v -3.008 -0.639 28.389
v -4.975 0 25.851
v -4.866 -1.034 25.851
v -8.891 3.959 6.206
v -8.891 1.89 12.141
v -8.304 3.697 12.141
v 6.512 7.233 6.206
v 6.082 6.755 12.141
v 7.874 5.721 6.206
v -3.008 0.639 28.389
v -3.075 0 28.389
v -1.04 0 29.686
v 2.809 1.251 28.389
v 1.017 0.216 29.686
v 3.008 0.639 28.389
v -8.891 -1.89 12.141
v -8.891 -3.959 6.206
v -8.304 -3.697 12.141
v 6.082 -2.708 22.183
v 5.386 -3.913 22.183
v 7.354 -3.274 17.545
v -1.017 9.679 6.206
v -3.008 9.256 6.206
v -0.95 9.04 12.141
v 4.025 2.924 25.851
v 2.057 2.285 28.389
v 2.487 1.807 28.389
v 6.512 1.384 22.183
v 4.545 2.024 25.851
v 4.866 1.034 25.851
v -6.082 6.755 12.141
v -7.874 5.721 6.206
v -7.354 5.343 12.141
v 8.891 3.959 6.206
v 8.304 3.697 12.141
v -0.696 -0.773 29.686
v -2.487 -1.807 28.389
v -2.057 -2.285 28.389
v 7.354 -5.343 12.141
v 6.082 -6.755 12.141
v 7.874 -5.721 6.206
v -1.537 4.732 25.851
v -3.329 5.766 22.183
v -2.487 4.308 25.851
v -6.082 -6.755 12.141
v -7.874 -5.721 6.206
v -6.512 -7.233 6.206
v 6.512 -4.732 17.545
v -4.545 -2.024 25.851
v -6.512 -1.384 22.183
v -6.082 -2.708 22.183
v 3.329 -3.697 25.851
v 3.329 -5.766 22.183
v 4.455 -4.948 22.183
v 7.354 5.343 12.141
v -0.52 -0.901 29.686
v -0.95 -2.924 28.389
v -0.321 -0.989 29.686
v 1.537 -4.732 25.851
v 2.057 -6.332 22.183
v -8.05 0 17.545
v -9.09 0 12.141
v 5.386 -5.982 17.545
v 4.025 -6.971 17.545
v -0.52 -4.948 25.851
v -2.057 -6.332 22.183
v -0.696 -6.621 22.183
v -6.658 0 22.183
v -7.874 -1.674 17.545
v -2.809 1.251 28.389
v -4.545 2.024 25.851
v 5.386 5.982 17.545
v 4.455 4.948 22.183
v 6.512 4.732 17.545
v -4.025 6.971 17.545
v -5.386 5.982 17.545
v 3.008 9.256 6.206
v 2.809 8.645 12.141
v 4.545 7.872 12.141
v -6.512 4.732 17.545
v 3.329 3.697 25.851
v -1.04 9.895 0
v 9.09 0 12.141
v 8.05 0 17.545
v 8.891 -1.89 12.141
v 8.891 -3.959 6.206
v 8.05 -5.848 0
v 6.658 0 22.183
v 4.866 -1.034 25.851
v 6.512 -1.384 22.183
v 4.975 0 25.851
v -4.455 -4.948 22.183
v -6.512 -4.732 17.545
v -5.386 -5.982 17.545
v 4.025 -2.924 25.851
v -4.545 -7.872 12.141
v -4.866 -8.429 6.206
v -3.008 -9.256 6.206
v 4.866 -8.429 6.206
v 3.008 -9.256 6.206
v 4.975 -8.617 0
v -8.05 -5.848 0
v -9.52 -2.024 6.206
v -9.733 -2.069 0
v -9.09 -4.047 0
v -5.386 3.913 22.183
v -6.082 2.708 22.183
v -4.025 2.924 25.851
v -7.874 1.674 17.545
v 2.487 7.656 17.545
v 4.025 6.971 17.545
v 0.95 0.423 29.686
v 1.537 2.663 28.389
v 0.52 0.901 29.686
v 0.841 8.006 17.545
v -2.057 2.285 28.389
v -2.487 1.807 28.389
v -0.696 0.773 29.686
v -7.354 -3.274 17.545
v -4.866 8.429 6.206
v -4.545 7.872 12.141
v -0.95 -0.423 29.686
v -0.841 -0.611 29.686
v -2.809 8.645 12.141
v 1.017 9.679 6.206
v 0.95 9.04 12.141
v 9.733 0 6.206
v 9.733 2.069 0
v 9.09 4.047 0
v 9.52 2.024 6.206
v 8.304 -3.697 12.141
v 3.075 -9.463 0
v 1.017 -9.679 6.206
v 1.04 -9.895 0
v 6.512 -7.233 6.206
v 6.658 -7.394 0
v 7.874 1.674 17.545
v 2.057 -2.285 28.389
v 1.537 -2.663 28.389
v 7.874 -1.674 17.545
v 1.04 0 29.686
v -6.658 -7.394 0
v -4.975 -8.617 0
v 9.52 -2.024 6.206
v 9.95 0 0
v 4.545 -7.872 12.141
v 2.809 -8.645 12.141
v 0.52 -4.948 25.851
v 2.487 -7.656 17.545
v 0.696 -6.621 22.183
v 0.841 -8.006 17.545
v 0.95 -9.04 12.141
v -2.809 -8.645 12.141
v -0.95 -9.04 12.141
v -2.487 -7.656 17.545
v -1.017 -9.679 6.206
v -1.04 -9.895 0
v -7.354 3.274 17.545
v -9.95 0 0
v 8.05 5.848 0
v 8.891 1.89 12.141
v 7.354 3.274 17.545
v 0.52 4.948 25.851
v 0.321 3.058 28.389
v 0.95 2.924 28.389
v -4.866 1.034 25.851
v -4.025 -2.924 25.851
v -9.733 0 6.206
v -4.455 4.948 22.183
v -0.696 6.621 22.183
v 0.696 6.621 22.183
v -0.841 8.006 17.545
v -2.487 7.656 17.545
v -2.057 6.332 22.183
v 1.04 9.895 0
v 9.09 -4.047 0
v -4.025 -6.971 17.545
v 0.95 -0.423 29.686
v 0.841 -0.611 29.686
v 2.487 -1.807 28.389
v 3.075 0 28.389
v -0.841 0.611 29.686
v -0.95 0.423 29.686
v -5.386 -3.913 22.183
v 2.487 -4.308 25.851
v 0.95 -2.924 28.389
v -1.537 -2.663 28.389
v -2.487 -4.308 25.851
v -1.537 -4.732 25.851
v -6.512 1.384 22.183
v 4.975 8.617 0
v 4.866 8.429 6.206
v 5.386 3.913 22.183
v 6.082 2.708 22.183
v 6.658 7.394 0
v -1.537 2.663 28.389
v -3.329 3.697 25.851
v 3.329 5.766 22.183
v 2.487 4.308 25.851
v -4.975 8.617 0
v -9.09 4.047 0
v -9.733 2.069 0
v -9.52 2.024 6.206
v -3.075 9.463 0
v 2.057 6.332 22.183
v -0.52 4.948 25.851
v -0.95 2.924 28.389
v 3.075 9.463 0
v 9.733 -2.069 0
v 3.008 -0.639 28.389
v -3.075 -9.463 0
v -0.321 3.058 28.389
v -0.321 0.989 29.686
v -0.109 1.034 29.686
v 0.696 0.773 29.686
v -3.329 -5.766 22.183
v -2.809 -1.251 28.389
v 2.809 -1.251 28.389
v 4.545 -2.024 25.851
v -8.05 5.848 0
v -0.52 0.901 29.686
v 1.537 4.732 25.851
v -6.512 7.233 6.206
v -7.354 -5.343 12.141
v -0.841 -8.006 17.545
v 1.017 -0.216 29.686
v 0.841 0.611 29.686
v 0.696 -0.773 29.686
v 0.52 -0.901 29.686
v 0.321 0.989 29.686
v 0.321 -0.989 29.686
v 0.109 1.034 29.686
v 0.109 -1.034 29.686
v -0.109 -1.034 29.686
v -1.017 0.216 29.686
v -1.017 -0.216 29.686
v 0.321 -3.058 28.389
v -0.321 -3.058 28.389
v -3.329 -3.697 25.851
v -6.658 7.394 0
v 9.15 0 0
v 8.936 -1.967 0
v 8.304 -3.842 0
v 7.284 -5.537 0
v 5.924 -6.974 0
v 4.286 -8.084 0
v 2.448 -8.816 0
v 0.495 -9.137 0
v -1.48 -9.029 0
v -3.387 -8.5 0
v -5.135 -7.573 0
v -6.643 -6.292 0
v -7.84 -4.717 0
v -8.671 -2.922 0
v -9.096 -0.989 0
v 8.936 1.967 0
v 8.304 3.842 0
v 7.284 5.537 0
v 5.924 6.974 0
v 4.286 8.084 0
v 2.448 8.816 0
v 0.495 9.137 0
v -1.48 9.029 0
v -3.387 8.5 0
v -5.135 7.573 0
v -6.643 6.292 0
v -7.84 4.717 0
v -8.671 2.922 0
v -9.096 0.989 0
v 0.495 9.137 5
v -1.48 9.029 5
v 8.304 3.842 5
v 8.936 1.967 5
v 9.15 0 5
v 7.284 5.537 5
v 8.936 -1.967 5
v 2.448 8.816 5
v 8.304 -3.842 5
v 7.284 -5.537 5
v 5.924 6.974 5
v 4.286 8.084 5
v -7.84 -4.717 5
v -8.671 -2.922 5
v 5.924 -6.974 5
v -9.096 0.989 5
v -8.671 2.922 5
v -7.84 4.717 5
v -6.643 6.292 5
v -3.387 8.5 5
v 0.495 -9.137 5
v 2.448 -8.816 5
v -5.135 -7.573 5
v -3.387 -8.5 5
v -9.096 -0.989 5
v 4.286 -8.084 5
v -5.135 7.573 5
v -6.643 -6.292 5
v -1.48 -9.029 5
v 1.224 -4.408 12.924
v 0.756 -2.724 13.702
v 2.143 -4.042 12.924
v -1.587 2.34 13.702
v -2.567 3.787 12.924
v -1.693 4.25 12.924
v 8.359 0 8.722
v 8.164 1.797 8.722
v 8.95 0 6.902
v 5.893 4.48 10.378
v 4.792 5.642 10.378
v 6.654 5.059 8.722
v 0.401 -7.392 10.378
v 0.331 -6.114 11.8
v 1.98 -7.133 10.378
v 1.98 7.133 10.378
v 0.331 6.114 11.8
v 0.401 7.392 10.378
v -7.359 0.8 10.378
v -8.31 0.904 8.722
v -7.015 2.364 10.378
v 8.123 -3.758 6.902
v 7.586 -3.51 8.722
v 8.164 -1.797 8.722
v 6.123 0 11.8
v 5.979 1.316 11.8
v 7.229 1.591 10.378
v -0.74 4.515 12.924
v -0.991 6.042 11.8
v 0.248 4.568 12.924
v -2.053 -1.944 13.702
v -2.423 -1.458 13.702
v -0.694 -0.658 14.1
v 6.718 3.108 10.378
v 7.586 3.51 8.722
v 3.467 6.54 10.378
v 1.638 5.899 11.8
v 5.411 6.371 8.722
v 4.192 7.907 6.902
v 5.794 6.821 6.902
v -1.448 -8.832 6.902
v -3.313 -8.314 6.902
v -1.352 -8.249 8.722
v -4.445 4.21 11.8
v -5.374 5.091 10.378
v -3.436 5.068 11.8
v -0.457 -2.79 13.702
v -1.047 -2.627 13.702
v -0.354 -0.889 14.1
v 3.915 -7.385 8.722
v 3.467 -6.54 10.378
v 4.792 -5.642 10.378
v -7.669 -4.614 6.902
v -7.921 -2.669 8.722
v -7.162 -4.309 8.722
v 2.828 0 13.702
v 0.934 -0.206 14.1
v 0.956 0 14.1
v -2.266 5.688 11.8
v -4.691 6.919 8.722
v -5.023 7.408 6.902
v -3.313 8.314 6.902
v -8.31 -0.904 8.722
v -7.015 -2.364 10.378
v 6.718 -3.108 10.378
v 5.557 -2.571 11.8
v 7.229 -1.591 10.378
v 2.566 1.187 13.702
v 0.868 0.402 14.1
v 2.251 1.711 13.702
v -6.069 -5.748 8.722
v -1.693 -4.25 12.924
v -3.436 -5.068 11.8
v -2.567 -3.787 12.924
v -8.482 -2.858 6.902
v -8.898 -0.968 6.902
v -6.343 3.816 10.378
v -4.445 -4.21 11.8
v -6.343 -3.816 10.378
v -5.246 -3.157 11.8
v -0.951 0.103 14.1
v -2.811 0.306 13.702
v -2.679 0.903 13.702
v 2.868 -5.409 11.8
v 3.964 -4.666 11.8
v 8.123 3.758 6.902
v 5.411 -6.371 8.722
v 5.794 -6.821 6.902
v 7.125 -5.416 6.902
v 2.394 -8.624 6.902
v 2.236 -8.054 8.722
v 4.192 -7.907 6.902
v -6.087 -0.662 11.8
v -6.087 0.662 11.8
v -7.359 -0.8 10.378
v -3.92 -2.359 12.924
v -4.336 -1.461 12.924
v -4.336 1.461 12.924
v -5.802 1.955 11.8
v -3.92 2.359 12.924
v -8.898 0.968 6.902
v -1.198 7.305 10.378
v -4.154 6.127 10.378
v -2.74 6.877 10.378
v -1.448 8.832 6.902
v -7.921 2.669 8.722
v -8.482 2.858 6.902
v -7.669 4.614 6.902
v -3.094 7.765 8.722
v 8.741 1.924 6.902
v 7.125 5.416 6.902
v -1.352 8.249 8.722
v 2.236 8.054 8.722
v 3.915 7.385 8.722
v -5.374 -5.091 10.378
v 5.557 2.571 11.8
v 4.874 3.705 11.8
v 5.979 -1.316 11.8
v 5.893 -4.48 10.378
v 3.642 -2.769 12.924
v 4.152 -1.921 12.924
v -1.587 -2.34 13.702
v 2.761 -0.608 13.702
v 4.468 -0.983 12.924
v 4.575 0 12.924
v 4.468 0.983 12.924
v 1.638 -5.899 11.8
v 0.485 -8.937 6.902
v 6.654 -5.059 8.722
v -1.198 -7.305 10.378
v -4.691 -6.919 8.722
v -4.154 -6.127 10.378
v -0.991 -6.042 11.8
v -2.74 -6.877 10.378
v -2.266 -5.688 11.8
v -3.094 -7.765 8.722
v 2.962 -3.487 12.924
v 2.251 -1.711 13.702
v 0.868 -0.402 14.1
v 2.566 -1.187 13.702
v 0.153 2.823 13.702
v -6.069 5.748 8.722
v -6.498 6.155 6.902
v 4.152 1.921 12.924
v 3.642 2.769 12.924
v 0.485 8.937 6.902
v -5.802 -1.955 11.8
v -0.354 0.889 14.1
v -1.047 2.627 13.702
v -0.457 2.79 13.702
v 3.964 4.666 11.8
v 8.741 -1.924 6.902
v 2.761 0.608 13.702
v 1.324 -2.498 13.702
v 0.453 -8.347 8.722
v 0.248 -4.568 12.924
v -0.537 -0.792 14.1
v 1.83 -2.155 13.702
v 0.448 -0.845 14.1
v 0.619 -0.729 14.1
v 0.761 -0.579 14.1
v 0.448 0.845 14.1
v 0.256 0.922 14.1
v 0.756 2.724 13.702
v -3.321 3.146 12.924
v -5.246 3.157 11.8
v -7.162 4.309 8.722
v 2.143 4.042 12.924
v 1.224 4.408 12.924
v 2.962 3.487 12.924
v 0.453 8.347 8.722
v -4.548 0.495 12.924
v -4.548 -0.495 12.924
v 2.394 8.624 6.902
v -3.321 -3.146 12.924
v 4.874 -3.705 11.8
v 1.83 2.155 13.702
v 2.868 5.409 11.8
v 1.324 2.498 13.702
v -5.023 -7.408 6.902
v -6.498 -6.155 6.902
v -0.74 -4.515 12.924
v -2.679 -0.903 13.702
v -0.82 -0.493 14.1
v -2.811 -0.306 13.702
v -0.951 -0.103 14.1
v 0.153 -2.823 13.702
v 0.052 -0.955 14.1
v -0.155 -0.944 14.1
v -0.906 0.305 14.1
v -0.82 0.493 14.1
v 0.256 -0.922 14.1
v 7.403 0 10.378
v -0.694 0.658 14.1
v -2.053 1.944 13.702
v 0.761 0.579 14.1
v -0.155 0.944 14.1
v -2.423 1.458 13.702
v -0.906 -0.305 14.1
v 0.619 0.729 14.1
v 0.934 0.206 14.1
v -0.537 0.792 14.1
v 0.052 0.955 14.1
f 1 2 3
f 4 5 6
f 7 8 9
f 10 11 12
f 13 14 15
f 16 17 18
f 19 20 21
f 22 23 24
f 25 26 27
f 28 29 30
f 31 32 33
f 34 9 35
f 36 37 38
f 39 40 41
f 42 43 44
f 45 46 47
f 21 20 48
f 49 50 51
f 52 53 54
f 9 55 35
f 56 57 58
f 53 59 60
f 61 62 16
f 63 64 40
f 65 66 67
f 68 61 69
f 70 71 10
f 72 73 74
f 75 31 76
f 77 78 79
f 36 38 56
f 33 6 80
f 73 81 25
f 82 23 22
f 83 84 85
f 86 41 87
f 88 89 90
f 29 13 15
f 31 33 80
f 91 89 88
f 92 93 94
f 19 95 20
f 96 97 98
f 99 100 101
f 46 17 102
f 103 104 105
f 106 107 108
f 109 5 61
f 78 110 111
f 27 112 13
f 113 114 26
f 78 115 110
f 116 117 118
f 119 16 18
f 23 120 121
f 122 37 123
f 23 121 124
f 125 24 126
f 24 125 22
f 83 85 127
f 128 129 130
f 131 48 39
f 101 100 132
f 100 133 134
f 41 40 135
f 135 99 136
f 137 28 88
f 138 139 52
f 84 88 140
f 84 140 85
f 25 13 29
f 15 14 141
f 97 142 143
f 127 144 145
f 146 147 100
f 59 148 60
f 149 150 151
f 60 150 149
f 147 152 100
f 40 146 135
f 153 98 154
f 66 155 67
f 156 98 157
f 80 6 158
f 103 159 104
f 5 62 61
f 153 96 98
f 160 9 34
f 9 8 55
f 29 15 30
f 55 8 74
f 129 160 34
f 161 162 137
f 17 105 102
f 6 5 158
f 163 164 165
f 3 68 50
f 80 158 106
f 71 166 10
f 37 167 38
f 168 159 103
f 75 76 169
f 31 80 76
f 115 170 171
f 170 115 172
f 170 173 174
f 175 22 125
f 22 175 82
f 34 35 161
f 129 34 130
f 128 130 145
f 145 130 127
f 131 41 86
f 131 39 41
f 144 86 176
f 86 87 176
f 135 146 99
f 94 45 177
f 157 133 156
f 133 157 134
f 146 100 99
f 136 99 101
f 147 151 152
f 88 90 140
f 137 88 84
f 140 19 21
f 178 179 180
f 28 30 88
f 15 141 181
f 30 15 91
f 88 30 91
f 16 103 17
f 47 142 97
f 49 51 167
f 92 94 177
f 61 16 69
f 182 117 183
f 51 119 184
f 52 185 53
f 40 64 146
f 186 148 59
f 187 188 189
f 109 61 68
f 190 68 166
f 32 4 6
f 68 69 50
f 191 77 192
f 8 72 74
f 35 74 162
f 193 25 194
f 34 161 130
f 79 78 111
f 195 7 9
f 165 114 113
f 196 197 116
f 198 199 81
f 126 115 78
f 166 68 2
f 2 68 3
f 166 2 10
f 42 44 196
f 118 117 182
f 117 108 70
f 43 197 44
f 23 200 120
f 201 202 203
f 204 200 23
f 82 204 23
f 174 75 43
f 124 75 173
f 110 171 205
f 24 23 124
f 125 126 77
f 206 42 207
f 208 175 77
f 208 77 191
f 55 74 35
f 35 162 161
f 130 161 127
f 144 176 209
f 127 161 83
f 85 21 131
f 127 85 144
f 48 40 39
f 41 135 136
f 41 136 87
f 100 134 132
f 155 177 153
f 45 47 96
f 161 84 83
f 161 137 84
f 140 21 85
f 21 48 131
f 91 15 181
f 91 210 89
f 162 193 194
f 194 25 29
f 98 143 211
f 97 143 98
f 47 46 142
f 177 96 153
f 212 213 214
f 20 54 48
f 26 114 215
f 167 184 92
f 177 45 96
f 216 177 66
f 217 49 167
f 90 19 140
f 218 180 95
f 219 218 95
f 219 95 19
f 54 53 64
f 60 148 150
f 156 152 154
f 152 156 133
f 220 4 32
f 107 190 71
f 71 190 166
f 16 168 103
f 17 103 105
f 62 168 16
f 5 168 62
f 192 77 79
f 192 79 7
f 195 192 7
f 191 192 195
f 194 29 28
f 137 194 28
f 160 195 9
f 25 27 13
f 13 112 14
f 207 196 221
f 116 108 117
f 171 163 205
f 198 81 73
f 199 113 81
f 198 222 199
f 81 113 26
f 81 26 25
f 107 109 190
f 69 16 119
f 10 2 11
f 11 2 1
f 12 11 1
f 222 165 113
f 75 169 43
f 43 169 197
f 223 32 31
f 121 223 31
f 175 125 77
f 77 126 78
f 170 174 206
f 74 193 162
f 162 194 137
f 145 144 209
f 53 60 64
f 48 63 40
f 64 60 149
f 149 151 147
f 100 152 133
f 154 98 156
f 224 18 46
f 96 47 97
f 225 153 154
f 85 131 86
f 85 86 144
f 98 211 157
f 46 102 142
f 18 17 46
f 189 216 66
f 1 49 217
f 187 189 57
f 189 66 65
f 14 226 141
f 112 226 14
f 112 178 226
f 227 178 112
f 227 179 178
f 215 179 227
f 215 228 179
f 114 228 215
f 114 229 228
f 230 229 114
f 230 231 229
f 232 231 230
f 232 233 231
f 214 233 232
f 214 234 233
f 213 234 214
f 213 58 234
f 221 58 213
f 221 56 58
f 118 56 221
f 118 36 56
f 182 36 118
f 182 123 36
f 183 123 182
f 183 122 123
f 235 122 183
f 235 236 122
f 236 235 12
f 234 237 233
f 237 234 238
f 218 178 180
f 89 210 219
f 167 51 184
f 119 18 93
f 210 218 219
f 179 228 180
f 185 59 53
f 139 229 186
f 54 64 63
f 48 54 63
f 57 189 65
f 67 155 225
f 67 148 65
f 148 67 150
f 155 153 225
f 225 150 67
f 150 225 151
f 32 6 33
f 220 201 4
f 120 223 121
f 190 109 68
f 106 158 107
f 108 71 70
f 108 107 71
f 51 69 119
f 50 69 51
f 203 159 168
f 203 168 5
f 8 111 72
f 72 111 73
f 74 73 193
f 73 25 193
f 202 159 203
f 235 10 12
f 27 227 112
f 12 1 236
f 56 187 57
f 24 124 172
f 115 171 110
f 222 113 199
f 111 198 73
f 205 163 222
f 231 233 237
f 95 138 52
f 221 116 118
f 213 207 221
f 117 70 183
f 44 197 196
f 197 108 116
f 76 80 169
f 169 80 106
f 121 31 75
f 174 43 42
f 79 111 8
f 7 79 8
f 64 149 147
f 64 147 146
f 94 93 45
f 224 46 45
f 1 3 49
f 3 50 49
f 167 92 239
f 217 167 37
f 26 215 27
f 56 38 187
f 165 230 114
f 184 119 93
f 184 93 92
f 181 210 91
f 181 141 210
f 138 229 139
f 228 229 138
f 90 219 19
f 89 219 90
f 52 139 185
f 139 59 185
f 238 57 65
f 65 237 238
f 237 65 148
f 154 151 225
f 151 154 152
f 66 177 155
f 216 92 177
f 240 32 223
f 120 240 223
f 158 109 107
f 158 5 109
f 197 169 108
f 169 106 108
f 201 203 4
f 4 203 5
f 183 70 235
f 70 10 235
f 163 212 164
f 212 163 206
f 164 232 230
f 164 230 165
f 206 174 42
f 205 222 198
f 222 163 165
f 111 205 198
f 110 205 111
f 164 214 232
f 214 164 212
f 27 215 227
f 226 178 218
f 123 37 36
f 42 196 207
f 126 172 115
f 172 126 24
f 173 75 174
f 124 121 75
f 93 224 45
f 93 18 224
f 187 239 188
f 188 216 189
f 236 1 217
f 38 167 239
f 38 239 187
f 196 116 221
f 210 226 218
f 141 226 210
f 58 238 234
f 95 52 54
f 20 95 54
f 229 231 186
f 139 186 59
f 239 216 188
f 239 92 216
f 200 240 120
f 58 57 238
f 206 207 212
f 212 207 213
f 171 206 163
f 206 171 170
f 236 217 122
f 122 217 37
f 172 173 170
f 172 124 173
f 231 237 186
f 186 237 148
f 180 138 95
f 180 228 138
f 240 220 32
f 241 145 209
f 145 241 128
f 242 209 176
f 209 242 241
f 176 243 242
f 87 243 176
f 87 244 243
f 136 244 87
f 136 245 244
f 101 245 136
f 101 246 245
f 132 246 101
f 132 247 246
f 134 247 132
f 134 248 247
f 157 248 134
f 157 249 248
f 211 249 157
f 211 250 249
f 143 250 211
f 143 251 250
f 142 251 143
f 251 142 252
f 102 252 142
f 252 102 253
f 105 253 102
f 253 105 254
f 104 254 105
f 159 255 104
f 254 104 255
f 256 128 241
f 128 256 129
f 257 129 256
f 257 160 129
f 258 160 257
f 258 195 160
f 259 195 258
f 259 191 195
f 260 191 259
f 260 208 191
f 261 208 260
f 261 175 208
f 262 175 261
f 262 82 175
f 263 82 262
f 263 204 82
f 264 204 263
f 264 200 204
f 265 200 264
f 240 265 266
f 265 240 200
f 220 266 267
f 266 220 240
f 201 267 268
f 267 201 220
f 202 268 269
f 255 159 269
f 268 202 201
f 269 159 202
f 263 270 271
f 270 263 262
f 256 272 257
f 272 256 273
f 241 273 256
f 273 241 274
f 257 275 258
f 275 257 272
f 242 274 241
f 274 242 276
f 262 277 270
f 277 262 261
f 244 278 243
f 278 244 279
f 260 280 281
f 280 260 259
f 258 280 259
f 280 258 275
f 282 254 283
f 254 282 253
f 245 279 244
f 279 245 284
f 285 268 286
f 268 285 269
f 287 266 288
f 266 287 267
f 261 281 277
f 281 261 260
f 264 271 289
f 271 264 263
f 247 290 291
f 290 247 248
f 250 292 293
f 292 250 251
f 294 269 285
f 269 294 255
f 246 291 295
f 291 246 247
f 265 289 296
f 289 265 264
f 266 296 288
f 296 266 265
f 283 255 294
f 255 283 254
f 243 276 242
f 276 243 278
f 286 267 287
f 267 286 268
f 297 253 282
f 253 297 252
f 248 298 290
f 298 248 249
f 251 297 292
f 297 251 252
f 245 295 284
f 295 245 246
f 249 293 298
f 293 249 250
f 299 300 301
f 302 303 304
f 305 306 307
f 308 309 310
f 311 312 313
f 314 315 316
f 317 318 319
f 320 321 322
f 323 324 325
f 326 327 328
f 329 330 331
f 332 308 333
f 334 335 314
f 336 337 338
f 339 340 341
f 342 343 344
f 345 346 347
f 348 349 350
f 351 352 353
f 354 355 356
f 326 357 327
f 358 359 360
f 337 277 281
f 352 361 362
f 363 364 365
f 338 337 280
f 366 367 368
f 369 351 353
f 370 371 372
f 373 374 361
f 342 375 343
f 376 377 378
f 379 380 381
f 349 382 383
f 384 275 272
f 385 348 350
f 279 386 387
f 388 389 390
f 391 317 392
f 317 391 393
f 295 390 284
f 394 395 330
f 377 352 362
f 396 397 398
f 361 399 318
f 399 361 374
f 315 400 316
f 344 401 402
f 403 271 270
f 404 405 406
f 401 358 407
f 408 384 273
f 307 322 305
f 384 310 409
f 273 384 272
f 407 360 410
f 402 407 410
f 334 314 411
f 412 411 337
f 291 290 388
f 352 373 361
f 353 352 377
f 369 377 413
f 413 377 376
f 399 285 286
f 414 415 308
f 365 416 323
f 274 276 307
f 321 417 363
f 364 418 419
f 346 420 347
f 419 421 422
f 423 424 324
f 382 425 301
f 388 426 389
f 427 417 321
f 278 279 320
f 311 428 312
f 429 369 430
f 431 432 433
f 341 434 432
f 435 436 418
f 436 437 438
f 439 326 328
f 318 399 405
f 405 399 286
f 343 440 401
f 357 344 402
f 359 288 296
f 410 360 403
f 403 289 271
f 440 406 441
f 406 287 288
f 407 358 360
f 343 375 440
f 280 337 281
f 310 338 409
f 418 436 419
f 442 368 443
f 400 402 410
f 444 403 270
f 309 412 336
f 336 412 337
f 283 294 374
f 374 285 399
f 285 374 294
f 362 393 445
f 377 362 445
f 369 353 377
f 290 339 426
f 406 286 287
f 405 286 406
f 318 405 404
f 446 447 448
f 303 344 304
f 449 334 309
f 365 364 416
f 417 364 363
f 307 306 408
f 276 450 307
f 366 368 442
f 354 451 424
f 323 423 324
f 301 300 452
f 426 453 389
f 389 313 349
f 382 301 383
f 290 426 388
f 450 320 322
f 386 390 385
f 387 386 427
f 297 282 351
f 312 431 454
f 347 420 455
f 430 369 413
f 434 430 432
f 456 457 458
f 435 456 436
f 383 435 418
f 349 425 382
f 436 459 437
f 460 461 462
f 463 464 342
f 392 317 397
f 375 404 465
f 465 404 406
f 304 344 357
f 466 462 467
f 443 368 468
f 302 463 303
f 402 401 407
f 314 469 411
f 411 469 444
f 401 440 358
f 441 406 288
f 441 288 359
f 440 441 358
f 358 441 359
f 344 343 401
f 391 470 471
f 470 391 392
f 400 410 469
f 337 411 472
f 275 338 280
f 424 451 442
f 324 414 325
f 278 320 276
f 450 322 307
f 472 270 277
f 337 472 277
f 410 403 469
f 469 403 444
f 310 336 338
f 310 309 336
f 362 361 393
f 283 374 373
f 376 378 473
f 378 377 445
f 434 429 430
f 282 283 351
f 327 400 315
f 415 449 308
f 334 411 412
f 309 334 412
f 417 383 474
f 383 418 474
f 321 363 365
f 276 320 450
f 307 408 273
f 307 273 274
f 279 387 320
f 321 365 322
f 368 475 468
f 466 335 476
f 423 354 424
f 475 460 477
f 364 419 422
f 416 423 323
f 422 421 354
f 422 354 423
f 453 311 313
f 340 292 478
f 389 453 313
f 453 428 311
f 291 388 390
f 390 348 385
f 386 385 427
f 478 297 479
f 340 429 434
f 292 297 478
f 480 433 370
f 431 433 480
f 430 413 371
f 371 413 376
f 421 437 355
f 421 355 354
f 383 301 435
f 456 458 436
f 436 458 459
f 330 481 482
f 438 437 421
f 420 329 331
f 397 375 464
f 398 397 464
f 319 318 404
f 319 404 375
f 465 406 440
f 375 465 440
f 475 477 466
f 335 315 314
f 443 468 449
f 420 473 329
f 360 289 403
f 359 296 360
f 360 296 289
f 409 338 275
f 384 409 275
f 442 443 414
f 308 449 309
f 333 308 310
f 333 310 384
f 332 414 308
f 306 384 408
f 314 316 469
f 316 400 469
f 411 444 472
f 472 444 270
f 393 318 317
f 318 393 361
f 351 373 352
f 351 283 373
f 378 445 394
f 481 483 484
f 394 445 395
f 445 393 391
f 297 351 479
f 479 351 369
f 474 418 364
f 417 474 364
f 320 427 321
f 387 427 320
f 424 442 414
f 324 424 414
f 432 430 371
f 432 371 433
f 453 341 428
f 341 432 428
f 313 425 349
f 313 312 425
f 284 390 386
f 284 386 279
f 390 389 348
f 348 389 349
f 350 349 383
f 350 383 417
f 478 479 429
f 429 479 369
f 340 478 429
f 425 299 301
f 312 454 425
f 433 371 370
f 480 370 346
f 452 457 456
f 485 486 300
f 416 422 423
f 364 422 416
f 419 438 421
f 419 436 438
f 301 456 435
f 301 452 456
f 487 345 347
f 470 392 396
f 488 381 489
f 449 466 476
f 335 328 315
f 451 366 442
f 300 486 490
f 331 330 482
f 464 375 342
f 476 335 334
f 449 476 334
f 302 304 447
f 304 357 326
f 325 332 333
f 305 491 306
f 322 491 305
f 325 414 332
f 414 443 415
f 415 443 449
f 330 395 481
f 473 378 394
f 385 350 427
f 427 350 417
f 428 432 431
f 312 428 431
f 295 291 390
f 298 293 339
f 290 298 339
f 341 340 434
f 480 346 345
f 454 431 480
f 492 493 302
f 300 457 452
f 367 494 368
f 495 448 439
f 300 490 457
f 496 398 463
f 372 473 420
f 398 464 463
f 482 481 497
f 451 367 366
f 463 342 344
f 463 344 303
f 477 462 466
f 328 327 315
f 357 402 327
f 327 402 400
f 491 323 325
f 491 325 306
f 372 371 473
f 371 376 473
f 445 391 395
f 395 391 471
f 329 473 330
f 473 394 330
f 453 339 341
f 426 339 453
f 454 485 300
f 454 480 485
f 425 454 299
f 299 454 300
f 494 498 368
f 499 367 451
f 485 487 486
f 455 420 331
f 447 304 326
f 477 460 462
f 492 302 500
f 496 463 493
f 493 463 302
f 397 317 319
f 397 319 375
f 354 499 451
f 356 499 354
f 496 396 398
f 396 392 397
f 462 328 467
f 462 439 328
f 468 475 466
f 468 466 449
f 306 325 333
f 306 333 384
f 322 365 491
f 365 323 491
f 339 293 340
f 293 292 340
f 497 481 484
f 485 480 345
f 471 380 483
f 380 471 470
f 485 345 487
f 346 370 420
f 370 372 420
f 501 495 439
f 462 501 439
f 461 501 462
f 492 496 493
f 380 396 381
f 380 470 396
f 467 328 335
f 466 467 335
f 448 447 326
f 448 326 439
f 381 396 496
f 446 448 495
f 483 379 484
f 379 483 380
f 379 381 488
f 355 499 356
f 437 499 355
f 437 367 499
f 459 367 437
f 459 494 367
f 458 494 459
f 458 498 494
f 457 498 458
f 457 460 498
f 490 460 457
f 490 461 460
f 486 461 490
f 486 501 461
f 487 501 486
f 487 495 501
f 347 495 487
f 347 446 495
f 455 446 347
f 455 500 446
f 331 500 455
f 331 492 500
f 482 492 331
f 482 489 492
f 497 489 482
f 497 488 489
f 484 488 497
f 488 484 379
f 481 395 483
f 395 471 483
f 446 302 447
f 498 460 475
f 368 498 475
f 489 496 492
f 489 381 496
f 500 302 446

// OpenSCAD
// buri.scad

tol = 0.4;

engine_radius = 17.5 / 2;
engine_height = 70;

nose_assembly_thickness = 1.2;
nose_assembly_slot_height = 5;

difference() {
  // the nose cone
  difference() {
    scale([1, 1, 3]) {
      sphere(engine_radius + nose_assembly_thickness);
    }
    translate([0, 0, -4 / 2 * engine_radius]) {
      cube(4 * engine_radius * [1, 1, 1], true);
    }
  }

  translate([0, 0, nose_assembly_slot_height]) {
    mirror([0, 0, 1]) {
      // the engine
      // remove the '#' that was in front of the cylinder()
      cylinder(engine_height, engine_radius + tol, engine_radius + tol);

      // the inner dome
      sphere(engine_radius + tol);
    }
  }
}
